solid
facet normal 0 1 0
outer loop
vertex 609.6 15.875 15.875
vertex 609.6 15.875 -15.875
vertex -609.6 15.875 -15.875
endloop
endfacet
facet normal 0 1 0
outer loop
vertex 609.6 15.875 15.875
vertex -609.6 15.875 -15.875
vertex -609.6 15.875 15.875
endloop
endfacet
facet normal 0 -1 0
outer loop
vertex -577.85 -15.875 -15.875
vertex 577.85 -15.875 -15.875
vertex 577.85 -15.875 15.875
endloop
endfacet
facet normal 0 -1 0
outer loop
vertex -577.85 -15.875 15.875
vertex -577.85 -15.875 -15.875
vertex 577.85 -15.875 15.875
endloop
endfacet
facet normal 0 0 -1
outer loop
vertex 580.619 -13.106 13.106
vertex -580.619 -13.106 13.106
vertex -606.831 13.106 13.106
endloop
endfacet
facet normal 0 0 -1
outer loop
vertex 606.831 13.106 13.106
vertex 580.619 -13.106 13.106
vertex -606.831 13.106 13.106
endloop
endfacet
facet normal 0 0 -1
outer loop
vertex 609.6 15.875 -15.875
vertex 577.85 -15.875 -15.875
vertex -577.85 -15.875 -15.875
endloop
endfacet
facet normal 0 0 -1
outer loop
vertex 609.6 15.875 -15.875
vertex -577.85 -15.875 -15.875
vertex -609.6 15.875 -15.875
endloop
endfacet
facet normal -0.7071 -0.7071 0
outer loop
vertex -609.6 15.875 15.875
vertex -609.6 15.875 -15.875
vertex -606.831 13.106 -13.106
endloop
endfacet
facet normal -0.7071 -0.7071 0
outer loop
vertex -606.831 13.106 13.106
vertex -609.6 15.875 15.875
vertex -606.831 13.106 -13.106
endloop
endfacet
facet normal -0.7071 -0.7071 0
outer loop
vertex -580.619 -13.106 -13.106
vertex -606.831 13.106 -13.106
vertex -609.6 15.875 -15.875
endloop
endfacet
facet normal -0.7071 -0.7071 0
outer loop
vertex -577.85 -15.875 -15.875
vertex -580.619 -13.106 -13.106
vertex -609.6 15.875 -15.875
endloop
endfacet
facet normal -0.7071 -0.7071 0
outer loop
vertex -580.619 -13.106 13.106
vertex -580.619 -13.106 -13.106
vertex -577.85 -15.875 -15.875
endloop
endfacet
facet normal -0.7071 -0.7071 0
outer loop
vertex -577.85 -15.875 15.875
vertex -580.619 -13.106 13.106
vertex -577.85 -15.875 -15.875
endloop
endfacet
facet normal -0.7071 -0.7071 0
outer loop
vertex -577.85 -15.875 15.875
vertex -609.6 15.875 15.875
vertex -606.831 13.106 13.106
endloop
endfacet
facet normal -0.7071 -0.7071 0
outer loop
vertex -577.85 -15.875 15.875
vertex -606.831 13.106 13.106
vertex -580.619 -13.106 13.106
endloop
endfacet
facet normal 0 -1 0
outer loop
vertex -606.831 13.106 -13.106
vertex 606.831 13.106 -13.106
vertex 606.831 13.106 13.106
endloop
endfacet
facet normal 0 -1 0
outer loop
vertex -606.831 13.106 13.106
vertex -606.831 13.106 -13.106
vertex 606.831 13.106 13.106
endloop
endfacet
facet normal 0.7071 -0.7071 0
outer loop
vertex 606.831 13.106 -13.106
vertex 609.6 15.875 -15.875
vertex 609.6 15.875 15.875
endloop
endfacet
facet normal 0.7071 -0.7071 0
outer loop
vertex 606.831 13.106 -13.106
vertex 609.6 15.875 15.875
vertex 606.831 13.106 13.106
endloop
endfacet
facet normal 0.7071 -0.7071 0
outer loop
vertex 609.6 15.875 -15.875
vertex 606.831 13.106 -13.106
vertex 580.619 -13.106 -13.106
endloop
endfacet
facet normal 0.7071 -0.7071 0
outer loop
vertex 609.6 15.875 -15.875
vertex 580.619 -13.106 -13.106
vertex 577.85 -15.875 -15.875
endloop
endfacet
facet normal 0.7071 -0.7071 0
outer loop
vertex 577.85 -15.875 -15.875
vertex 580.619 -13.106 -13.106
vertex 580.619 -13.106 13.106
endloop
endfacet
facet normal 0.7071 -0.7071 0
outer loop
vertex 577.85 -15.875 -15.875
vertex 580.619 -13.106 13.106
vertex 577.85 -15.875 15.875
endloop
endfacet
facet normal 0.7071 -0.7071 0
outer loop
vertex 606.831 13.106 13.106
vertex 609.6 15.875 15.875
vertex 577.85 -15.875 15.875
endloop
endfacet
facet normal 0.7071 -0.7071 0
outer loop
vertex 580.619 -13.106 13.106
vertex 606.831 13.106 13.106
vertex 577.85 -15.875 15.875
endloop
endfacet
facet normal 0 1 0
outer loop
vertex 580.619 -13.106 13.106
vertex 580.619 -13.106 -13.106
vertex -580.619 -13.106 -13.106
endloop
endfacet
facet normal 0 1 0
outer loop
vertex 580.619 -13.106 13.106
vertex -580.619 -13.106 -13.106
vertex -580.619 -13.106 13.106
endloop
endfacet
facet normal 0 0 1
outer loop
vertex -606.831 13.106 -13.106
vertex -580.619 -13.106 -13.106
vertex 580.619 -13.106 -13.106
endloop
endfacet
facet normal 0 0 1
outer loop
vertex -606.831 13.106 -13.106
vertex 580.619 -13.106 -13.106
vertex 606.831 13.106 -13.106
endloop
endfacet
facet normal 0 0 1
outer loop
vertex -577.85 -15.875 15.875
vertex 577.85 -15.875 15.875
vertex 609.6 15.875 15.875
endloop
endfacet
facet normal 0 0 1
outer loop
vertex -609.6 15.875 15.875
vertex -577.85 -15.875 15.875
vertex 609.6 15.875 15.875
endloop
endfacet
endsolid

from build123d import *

# Parameters (mm, degrees)
SKETCH_W       = 31.75
SKETCH_H       = 31.75
SKETCH_W_2     = 26.2128
SKETCH_H_2     = 26.2128
PAD_DEPTH      = 609.6
PAD_DEPTH_BACK = 609.6
POCKET_DEPTH   = 31.75


with BuildPart() as part:
    # Sketch → Pad (new body, two sides)
    with BuildSketch(Plane.YZ) as pad_sk:
        Rectangle(SKETCH_W, SKETCH_H)
        Rectangle(SKETCH_W_2, SKETCH_H_2, mode=Mode.SUBTRACT)
    extrude(amount=PAD_DEPTH)
    extrude(pad_sk.sketch, amount=-PAD_DEPTH_BACK)

    # Sketch001 → Pocket (cut)
    with BuildSketch(Plane(origin=(0, 0, 15.875), x_dir=(0, -1, 0), z_dir=(0, 0, 1))):
        Polygon((15.875, 609.6), (-15.875, 609.6), (15.875, 577.85), align=None)
    pocket = extrude(amount=-POCKET_DEPTH, mode=Mode.SUBTRACT)

    # Mirrored: Pocket across Sketch001 H_Axis
    add(pocket.mirror(Plane(origin=(0, 0, 15.875), x_dir=(0, 0, 1), z_dir=(1, 0, 0))), mode=Mode.SUBTRACT)


solid = part.part
